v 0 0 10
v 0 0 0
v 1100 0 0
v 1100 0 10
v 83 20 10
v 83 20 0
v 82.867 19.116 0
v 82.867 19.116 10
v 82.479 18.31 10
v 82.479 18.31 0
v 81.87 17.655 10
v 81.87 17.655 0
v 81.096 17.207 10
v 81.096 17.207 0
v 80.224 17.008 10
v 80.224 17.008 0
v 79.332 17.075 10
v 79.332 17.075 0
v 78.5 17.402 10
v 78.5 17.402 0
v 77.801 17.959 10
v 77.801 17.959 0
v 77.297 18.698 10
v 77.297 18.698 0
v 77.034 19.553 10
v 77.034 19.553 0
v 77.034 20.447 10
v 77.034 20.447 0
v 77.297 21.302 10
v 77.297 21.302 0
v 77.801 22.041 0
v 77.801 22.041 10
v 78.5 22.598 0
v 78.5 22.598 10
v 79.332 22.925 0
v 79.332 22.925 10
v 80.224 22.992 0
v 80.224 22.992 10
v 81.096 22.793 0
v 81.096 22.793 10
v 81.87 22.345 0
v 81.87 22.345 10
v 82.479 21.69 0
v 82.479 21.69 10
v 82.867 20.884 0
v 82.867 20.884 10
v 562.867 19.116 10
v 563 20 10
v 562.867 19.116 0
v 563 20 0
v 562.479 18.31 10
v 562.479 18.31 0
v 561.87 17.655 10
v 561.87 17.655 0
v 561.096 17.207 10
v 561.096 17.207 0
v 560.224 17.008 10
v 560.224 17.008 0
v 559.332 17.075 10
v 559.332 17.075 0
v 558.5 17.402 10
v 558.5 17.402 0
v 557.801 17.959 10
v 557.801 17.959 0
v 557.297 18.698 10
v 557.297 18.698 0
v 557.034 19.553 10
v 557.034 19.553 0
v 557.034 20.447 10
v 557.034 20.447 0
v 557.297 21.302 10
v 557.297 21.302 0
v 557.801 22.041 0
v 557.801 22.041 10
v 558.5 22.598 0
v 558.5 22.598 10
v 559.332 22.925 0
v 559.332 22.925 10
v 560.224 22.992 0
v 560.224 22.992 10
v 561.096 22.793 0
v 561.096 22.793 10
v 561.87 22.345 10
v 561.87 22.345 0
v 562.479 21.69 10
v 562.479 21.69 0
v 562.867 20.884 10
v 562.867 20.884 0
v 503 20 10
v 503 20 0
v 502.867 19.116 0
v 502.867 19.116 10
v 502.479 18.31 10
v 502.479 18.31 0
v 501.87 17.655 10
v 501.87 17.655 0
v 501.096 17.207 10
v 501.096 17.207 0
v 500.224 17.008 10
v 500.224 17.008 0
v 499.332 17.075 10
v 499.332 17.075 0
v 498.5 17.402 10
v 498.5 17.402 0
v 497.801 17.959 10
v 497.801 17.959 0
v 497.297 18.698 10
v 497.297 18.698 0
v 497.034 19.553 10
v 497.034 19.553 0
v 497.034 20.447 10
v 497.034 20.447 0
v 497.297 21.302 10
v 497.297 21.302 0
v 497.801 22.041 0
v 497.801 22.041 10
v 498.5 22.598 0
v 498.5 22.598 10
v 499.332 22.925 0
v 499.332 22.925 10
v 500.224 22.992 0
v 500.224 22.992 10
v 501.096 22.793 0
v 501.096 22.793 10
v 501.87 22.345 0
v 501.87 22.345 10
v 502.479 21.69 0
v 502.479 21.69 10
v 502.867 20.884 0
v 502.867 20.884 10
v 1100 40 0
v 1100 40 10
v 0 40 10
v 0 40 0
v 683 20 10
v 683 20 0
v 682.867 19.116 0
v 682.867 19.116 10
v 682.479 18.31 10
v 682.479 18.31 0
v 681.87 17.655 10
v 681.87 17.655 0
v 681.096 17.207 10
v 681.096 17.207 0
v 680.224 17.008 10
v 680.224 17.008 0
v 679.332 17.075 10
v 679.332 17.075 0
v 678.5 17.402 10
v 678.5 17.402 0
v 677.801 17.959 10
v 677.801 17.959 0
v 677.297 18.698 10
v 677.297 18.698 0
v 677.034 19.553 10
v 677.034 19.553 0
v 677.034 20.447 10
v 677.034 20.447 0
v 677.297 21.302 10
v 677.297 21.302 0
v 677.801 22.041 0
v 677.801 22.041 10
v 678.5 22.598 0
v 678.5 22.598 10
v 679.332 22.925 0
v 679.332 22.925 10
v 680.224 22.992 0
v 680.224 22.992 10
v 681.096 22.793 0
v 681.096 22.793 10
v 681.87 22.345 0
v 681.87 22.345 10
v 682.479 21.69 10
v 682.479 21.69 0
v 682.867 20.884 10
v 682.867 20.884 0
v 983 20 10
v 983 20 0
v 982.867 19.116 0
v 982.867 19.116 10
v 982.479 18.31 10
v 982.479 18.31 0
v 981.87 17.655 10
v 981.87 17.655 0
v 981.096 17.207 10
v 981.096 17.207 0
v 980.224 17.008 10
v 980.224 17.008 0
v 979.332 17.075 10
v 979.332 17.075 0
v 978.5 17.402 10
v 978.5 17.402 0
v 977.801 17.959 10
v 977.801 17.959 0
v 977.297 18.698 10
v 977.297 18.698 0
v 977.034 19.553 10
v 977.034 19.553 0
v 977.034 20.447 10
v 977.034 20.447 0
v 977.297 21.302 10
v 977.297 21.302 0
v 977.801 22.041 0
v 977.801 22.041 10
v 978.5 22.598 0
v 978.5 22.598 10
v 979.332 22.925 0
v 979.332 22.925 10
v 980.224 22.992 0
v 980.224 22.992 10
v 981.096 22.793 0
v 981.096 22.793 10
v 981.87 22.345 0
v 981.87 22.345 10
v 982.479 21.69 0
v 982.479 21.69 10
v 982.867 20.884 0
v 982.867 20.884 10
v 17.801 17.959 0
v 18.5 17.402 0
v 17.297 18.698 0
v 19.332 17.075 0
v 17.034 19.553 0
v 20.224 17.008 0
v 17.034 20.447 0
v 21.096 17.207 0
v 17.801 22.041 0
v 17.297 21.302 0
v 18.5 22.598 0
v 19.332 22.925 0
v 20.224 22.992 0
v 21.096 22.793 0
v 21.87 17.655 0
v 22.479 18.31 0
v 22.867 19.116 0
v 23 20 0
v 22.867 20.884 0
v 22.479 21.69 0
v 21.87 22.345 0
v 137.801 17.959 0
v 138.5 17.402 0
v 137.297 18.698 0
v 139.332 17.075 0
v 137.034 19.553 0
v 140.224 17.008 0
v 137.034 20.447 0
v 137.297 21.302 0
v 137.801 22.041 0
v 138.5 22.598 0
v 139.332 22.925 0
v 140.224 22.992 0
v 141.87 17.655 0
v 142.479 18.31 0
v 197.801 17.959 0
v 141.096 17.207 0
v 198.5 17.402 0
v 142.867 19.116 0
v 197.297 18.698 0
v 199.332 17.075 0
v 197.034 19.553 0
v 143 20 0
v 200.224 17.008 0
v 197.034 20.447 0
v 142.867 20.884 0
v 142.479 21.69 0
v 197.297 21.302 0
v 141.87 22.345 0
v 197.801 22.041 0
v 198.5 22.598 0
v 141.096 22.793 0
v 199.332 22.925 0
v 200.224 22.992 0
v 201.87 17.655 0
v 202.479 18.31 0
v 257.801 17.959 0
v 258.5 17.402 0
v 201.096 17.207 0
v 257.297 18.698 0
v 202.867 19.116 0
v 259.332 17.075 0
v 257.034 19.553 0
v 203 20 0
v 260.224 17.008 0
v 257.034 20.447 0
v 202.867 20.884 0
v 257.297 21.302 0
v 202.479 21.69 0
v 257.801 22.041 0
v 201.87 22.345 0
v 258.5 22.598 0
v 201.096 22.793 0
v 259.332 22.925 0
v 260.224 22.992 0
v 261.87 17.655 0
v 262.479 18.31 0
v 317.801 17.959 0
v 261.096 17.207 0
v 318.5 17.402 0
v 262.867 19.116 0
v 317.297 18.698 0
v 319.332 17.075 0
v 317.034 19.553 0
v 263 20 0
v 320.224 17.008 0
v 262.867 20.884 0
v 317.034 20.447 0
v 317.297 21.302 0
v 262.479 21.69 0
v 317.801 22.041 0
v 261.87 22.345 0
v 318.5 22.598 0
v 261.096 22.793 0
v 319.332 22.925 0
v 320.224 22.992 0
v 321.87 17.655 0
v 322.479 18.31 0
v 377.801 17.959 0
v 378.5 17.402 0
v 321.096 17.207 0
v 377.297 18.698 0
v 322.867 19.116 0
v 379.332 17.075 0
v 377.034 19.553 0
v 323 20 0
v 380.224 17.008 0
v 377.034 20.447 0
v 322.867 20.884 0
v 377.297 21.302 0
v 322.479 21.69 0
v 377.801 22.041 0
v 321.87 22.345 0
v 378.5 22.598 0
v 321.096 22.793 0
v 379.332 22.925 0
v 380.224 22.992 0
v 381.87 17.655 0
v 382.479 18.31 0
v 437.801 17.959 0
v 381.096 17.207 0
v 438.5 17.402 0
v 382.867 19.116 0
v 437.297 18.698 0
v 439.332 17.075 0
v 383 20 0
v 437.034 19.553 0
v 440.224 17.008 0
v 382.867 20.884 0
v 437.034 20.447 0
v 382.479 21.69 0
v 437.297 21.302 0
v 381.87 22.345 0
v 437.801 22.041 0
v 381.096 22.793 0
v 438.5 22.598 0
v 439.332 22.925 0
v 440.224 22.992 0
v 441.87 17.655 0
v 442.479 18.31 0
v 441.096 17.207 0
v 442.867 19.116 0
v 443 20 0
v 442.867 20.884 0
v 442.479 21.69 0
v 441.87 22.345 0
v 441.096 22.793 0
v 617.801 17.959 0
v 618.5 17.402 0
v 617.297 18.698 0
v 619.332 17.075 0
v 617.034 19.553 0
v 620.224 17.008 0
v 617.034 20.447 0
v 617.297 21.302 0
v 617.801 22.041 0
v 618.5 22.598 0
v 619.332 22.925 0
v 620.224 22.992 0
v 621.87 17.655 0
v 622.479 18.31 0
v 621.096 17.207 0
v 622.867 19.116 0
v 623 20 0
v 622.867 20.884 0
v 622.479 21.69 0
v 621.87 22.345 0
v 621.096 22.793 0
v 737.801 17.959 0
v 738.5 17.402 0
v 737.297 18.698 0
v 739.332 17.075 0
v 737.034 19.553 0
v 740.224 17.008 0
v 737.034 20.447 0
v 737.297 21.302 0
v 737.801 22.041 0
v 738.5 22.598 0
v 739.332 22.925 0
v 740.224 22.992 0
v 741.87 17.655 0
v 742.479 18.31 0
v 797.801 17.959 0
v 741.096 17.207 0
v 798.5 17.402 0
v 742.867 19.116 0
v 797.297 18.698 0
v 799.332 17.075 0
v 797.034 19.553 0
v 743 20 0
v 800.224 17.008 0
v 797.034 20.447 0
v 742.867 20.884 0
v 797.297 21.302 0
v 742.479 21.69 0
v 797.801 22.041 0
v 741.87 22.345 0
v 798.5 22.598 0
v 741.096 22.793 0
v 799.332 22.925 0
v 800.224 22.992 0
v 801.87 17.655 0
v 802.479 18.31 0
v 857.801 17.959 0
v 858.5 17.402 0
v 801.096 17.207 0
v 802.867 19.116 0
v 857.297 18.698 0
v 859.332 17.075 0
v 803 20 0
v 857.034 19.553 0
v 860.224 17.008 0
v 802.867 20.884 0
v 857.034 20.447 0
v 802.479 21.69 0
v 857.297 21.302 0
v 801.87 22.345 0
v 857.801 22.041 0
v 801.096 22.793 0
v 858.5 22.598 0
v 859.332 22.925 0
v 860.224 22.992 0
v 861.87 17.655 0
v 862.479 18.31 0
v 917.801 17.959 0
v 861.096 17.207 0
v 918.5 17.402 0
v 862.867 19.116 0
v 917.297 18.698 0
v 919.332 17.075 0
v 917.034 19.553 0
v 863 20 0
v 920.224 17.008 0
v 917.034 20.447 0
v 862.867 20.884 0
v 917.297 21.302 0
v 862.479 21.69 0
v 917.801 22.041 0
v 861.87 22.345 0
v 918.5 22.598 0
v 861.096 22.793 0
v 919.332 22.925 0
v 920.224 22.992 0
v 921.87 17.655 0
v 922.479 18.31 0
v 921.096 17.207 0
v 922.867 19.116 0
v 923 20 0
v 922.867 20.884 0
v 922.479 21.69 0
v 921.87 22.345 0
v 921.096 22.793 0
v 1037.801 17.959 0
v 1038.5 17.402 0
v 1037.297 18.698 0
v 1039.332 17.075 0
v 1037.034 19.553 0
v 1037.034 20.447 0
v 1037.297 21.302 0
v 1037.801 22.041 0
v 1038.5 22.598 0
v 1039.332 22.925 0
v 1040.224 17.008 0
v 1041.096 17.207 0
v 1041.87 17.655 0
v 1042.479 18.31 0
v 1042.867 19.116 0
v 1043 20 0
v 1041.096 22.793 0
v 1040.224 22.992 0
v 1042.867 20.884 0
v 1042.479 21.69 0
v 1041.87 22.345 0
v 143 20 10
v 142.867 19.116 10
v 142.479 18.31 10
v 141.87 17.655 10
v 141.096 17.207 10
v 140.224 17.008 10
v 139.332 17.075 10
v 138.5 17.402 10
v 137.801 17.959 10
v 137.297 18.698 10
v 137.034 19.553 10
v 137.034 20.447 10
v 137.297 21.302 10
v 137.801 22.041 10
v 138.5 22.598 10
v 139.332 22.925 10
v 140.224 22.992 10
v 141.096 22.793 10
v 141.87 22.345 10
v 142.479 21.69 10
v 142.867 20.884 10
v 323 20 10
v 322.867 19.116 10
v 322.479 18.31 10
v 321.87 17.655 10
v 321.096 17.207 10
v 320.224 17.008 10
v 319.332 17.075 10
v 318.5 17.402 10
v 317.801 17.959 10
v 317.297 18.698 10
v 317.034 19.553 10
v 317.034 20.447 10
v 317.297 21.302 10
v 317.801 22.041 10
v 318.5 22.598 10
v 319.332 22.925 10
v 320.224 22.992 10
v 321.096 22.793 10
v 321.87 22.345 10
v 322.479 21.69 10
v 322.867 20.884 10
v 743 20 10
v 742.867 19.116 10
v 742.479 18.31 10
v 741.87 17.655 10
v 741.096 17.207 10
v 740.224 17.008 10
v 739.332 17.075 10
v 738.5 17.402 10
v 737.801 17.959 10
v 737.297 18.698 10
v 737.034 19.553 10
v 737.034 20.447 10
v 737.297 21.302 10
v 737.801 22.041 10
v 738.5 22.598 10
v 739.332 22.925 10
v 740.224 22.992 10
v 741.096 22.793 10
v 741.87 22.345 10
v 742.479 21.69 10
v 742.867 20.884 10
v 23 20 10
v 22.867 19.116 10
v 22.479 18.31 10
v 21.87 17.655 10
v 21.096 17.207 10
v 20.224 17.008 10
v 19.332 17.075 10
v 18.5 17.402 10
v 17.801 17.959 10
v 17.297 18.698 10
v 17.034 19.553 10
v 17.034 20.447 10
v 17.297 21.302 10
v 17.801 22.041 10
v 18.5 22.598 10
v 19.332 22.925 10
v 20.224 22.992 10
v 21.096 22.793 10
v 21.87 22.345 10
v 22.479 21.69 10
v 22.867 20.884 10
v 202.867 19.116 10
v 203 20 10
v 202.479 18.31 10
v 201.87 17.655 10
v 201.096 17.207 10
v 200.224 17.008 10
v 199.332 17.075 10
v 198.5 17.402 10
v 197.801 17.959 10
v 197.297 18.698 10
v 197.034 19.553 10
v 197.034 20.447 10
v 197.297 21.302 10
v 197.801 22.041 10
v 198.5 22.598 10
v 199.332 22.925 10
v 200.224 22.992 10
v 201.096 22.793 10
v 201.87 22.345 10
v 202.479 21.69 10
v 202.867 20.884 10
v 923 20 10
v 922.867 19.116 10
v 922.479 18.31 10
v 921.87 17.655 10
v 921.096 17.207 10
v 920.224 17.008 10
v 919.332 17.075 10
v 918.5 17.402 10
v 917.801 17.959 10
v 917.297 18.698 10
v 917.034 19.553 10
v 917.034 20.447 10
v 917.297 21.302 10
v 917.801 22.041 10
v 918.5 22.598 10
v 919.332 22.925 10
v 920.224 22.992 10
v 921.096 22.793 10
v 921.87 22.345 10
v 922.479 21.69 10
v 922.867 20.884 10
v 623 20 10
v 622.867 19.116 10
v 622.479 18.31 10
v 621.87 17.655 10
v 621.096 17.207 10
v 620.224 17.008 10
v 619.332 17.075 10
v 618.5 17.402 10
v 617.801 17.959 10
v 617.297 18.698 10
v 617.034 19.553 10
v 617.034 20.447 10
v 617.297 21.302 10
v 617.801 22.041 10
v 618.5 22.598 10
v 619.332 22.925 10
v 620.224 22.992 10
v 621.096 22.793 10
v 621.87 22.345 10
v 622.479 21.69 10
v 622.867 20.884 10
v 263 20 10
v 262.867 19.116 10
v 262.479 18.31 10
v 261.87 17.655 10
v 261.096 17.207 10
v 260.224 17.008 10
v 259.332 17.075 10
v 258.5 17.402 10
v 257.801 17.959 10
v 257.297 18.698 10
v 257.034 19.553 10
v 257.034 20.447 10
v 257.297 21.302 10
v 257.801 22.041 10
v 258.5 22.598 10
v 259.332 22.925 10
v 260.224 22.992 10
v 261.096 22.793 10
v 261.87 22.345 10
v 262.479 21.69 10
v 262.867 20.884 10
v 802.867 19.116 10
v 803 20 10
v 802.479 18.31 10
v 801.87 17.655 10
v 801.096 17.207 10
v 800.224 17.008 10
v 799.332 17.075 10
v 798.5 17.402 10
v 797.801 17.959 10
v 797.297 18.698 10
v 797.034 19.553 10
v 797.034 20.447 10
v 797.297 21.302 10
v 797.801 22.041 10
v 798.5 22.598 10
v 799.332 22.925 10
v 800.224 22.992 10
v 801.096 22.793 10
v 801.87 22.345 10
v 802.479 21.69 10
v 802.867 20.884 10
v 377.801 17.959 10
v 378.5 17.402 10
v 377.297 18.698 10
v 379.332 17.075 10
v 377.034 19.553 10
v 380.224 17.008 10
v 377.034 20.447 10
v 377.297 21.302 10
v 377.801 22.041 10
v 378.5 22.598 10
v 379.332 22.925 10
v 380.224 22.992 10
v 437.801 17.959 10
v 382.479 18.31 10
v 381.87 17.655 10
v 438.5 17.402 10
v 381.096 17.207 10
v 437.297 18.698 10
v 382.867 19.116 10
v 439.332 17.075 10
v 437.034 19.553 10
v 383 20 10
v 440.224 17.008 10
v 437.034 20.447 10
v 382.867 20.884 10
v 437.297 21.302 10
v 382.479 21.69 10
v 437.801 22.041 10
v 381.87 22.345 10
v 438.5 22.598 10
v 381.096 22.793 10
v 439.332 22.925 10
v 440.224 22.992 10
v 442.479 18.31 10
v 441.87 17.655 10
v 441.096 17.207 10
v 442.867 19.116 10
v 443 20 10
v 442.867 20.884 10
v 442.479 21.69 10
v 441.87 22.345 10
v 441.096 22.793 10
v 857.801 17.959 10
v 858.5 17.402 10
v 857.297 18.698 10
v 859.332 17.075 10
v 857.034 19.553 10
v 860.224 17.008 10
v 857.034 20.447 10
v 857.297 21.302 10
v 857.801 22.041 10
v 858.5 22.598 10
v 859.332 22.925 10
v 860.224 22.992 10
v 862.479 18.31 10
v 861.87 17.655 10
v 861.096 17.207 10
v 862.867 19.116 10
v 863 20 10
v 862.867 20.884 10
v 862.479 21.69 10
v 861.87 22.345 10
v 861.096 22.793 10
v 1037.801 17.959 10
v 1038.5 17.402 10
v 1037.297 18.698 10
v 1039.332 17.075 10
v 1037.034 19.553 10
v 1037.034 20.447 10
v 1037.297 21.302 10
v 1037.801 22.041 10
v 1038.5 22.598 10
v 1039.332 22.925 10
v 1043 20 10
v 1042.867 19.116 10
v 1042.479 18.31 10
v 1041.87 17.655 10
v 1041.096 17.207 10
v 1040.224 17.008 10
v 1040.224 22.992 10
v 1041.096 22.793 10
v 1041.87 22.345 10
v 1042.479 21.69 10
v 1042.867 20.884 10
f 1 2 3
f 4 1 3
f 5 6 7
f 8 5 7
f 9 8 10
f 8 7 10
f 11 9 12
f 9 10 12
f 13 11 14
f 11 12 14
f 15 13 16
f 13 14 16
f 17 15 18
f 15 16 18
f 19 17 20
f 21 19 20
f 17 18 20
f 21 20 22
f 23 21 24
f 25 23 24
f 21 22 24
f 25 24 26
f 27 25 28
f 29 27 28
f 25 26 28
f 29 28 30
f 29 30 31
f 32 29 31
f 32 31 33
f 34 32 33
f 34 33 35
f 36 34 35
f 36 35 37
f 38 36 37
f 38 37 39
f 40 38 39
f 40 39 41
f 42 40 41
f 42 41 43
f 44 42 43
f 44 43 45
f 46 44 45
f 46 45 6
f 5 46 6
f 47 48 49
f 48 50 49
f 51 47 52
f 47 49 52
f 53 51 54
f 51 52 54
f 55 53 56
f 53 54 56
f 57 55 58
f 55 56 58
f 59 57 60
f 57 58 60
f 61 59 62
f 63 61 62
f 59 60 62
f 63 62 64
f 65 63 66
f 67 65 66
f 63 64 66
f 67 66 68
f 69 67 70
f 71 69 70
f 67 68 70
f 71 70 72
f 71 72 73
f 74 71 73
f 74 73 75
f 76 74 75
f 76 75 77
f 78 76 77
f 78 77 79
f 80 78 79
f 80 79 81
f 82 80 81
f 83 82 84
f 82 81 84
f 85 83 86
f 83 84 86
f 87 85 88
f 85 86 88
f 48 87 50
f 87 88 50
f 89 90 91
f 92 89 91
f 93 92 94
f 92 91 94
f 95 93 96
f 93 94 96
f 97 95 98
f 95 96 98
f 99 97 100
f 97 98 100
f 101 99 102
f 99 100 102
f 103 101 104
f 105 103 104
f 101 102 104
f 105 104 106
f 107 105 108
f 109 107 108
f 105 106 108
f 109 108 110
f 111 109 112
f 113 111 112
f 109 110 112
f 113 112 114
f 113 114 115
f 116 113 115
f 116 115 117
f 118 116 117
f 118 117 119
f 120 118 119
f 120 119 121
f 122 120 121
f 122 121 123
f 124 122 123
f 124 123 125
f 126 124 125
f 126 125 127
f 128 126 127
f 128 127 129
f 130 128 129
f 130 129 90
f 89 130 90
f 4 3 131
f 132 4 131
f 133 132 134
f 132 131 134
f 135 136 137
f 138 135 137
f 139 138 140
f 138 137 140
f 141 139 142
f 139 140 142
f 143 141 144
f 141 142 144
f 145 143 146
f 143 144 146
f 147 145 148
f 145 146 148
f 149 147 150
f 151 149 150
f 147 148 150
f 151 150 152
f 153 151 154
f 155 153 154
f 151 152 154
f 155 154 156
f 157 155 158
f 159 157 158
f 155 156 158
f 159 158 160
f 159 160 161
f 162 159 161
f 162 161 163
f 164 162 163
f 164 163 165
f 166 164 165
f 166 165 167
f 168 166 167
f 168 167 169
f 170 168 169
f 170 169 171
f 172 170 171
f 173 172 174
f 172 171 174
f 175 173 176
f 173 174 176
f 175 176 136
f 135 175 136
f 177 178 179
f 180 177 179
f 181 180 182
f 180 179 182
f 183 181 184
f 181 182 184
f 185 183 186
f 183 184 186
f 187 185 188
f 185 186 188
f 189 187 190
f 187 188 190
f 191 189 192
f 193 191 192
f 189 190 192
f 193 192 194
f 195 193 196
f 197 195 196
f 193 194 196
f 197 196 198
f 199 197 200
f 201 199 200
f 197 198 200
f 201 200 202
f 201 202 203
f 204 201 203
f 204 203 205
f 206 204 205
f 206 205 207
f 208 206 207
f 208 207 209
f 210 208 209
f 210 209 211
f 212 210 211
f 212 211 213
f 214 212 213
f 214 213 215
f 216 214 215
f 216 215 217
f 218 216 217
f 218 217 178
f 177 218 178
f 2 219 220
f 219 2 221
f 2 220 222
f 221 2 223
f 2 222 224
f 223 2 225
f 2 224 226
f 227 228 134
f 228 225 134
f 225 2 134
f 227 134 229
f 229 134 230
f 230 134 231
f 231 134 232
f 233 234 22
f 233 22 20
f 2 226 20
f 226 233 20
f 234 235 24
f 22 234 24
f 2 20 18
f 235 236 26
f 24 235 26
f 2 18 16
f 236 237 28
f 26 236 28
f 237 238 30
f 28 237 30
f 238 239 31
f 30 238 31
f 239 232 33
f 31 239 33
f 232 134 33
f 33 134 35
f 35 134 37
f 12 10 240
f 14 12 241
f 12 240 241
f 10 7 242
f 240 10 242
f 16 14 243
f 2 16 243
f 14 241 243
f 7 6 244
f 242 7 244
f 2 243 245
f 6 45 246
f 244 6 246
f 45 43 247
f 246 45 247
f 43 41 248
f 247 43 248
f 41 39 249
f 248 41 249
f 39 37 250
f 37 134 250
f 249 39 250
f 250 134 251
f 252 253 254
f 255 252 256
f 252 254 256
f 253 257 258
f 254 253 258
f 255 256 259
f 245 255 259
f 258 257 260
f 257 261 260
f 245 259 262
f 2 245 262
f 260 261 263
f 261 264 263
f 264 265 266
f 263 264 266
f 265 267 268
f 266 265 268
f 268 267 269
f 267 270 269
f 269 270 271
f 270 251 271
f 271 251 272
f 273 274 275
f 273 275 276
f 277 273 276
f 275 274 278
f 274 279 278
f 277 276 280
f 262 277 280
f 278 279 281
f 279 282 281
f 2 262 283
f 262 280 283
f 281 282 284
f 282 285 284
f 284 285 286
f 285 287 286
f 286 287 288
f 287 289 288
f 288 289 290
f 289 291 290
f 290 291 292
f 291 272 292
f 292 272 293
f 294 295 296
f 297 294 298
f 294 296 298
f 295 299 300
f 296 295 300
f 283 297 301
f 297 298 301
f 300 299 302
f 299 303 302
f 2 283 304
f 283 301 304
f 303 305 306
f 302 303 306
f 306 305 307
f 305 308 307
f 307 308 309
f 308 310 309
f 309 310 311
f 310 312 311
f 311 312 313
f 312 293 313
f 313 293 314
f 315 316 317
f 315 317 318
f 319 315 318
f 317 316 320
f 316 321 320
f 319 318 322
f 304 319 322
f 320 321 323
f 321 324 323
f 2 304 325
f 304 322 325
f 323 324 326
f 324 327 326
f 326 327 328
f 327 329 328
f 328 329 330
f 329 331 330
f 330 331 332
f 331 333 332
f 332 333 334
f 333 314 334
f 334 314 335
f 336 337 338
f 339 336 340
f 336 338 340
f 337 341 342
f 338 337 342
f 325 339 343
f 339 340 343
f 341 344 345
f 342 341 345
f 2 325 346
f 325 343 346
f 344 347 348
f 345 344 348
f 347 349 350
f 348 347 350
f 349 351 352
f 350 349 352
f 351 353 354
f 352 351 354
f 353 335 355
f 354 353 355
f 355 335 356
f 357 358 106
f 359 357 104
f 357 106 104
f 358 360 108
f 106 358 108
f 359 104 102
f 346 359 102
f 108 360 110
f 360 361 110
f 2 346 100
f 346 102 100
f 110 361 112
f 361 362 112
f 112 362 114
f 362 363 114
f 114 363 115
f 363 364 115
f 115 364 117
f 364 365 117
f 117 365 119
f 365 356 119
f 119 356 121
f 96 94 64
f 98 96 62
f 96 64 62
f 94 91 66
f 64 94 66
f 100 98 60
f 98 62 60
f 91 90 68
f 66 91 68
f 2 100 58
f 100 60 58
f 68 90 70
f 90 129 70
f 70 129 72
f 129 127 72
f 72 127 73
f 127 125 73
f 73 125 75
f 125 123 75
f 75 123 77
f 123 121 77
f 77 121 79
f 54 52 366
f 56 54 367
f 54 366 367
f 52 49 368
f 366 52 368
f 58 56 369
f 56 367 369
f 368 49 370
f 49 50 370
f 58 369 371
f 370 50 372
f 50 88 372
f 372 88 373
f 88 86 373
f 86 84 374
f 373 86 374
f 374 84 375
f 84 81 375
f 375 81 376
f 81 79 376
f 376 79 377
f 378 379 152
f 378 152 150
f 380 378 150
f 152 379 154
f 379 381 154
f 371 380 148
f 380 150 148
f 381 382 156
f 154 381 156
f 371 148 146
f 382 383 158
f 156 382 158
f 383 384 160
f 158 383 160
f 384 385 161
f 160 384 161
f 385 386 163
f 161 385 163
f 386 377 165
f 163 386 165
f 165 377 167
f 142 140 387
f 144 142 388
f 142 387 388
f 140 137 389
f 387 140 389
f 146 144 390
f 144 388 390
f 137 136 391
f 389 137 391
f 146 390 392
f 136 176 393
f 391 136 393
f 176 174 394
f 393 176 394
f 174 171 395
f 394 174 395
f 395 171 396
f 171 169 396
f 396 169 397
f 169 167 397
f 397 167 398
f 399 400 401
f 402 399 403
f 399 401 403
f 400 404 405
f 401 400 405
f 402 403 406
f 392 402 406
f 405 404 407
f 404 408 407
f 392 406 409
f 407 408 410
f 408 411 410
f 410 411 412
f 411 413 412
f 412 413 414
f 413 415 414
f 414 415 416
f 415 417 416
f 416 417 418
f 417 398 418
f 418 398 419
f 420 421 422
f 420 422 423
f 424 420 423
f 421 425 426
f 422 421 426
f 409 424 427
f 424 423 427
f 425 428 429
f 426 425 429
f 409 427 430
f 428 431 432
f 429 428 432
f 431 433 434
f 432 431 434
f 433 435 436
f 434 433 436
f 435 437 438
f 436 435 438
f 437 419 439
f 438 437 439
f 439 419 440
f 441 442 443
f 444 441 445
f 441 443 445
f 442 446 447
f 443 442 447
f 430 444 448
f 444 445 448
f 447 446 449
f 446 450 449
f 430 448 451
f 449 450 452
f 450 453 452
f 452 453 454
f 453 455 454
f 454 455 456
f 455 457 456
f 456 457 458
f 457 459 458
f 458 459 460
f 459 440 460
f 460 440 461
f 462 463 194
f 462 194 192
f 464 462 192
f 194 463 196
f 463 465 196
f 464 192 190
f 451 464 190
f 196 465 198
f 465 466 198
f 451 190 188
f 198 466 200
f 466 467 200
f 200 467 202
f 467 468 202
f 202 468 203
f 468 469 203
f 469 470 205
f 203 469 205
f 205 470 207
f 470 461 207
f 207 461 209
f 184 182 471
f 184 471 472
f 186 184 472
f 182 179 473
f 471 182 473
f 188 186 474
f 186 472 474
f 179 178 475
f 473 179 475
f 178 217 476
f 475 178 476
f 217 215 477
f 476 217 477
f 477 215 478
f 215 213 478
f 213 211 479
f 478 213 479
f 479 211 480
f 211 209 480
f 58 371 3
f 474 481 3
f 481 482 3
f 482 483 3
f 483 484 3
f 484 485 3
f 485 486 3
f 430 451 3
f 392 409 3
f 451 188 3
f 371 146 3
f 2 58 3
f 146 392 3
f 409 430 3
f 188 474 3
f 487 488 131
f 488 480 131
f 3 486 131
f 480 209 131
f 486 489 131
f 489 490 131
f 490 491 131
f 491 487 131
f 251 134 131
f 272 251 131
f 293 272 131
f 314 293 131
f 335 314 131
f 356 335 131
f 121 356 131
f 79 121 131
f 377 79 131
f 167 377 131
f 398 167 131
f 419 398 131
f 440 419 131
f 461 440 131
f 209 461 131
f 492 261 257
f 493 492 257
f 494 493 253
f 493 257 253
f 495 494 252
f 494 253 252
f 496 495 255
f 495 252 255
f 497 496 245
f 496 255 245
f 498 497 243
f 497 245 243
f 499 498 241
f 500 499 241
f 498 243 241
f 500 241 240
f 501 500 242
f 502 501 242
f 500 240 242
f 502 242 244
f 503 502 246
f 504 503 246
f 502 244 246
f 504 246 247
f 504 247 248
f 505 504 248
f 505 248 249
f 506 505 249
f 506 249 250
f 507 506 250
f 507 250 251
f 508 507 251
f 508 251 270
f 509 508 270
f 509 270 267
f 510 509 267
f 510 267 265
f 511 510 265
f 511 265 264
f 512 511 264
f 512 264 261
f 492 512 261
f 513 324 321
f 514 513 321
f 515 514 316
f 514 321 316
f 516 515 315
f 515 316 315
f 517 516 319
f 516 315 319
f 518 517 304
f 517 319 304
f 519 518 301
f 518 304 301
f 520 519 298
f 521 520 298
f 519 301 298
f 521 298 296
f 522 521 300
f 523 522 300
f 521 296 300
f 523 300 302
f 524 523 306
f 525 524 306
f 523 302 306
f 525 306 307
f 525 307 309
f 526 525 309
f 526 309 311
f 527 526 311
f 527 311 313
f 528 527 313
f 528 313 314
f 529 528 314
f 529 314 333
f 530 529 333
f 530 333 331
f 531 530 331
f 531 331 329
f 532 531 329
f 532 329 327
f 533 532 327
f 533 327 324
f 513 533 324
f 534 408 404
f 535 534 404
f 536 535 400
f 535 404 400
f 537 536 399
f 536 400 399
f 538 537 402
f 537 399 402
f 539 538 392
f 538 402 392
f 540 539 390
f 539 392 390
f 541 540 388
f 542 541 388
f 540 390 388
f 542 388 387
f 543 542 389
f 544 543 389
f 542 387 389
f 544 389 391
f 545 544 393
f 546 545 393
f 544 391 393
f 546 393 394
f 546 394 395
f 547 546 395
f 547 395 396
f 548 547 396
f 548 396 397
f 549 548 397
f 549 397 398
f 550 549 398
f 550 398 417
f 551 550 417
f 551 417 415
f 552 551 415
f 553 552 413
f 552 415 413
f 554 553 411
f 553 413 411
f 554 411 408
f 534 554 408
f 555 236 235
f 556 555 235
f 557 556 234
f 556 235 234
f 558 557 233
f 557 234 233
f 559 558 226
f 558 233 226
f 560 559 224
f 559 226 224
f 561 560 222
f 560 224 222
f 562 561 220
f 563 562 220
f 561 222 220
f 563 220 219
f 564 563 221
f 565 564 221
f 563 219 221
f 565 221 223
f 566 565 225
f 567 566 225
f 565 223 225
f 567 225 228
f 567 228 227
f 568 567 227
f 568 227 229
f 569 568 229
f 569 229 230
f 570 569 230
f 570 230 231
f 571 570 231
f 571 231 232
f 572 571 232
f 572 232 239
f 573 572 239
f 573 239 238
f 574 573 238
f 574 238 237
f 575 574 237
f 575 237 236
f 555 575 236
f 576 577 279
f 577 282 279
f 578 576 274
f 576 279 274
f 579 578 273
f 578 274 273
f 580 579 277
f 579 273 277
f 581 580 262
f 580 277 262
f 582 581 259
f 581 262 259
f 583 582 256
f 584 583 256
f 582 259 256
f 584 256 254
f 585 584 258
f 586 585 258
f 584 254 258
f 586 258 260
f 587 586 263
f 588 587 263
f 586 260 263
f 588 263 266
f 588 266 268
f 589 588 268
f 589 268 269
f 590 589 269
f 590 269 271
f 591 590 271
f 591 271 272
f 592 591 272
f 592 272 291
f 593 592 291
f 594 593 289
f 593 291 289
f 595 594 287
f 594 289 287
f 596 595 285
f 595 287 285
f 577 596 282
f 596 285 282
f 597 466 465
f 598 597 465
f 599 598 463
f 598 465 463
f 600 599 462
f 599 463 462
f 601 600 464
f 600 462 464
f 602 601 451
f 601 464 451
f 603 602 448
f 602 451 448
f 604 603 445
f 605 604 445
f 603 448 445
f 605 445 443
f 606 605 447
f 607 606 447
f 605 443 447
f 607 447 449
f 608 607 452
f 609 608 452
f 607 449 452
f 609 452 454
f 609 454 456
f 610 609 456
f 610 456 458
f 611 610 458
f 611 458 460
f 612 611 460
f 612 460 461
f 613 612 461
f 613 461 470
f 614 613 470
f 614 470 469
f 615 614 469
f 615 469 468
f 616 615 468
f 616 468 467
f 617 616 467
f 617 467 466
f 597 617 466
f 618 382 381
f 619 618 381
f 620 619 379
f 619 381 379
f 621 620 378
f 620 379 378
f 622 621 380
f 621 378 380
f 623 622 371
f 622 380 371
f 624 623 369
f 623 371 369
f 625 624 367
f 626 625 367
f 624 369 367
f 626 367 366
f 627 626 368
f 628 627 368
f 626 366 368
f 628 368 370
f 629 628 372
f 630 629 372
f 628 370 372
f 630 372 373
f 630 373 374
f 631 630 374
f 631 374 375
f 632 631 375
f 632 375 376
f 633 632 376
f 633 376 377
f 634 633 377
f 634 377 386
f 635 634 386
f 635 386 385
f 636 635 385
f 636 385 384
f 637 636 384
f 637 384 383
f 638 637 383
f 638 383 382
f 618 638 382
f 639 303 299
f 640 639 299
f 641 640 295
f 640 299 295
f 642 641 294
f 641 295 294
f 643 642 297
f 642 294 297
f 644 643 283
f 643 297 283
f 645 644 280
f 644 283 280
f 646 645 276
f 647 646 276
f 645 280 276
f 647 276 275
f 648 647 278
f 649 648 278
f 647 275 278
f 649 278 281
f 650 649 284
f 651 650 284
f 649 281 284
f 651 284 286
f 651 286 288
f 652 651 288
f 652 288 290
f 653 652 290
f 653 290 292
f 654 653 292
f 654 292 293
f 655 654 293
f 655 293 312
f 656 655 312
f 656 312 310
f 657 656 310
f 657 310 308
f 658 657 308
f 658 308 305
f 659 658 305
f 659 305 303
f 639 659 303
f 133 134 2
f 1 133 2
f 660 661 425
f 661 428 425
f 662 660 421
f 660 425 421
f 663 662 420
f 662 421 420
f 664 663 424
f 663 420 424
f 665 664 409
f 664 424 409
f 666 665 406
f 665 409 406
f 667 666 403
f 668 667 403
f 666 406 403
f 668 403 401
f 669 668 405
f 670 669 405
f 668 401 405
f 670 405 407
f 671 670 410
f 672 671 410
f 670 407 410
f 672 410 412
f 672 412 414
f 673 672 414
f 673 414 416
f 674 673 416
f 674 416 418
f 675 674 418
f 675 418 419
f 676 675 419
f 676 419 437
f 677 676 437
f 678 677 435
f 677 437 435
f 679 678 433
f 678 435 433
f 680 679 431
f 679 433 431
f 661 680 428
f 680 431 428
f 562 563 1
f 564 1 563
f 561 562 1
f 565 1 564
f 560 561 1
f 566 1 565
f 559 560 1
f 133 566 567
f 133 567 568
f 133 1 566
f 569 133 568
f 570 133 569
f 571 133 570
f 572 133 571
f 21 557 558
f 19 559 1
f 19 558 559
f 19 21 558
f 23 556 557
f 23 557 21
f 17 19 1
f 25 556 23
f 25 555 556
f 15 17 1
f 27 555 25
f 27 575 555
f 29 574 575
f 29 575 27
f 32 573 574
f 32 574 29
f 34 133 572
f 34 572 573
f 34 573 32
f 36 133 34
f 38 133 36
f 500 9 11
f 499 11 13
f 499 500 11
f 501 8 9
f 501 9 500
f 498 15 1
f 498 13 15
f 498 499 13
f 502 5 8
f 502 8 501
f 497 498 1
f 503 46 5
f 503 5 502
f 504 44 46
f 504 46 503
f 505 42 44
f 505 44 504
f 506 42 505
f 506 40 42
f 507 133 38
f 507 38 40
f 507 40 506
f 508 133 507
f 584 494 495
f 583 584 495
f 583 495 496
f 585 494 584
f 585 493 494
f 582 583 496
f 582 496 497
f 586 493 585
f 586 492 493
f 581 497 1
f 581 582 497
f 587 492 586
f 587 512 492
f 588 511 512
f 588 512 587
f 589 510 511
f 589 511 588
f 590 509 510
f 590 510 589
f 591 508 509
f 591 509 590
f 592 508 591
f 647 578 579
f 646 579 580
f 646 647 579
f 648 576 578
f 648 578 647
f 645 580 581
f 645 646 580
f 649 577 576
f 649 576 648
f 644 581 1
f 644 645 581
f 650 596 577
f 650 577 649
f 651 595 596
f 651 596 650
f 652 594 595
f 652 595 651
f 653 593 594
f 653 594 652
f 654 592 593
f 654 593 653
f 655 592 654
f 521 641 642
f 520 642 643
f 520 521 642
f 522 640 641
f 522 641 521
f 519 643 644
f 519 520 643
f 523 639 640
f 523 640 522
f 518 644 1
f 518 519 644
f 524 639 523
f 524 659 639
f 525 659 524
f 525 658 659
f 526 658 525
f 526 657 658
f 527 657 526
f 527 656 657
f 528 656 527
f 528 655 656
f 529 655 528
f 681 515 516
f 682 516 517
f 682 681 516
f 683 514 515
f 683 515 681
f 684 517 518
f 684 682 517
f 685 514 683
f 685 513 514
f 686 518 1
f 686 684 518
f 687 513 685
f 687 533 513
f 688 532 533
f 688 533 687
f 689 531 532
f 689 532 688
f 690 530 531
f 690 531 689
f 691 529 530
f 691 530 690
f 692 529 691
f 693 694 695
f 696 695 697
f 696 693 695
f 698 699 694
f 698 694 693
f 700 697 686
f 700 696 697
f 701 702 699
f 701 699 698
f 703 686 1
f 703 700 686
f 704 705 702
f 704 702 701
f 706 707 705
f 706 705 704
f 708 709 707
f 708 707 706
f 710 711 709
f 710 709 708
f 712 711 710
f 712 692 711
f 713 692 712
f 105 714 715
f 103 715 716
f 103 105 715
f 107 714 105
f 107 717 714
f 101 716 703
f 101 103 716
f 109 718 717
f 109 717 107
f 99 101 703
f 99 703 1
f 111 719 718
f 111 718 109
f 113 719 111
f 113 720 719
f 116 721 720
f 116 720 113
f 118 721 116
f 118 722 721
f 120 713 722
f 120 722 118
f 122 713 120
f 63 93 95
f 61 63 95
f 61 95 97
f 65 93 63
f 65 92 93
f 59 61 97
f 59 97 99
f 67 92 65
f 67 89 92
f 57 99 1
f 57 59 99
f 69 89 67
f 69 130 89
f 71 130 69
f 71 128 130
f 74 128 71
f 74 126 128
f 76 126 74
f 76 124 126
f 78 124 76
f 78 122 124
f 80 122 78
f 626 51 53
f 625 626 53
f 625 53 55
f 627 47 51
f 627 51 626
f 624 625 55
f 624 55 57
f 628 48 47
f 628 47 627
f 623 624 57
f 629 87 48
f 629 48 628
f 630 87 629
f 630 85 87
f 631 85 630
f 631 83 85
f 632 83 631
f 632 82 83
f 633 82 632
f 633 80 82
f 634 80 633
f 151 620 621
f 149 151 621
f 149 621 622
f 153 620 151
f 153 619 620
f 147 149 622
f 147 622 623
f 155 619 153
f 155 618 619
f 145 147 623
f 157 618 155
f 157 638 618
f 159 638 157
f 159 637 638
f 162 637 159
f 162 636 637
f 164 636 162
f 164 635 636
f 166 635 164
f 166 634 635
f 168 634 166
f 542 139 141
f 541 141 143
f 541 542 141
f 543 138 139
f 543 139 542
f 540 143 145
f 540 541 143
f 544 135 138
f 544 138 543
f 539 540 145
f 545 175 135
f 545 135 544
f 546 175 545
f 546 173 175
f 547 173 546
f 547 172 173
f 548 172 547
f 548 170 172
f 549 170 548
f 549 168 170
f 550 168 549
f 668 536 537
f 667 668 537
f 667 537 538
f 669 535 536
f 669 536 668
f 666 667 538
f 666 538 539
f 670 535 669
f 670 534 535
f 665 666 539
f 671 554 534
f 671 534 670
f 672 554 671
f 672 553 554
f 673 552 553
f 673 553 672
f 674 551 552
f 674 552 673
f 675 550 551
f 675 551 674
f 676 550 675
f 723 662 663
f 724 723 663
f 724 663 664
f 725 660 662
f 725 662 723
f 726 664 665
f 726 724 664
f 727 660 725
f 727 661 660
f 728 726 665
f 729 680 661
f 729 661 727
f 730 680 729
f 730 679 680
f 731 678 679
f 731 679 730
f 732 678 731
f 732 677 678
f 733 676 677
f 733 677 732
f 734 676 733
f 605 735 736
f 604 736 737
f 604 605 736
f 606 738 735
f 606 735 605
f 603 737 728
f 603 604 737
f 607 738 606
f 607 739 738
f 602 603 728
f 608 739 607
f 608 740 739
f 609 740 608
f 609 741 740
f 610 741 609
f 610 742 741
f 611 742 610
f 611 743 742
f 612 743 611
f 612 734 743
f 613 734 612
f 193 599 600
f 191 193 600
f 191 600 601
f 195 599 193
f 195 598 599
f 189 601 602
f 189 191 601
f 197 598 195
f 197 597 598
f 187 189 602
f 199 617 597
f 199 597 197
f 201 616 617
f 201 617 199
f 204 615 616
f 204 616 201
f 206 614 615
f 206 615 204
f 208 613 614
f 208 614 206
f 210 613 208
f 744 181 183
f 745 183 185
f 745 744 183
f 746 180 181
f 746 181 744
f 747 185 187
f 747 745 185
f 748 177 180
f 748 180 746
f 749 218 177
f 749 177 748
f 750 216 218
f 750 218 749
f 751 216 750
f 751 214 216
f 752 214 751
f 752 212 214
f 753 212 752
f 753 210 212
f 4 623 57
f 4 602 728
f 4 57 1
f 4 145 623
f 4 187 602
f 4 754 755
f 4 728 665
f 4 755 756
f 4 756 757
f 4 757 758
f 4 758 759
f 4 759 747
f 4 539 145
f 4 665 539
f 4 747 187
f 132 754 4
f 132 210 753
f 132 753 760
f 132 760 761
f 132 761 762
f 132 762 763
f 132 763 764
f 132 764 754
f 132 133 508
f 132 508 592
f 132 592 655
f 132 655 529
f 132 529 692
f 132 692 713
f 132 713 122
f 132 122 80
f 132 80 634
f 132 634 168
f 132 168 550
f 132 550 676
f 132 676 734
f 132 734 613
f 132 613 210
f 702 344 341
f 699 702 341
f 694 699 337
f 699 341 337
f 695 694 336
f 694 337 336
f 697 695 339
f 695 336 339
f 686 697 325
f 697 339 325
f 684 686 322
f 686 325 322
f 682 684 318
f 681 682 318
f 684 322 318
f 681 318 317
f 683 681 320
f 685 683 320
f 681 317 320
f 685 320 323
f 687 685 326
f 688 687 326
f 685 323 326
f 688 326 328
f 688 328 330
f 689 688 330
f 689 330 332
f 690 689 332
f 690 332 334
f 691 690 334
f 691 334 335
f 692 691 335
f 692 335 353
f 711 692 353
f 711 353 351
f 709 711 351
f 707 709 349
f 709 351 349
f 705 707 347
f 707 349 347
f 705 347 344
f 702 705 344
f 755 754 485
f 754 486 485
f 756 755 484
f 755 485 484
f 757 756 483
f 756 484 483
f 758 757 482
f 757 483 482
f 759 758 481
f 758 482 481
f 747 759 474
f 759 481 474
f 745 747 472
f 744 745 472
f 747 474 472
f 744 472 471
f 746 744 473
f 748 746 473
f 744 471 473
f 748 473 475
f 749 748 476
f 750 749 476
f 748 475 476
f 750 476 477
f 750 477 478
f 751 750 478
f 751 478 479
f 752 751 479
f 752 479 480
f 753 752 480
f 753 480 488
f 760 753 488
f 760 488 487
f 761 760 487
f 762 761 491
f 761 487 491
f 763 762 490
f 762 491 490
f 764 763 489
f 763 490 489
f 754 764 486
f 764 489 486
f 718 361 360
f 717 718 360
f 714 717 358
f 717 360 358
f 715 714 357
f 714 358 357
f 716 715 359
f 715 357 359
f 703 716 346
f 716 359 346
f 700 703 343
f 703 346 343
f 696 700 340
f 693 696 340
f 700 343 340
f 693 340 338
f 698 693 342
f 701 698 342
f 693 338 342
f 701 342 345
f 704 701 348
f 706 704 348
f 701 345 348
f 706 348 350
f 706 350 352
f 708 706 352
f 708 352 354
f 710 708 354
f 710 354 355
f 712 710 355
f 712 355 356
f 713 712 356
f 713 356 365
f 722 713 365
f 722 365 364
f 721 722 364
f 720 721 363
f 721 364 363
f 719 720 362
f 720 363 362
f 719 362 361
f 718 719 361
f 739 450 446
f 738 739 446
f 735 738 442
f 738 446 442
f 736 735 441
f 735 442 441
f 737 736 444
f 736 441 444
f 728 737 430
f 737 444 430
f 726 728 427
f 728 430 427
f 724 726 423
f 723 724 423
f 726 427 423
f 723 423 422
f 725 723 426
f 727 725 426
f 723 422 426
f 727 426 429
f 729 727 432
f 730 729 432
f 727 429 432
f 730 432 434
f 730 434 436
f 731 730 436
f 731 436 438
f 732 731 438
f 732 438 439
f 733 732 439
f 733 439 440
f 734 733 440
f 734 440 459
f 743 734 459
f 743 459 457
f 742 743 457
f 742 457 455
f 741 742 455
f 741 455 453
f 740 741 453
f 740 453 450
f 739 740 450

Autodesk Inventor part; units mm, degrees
ref_plane "YZ Plane" through (0, 0, 0) normal (1, 0, 0) x (0, 1, 0)
ref_plane "XZ Plane" through (0, 0, 0) normal (0, 1, 0) x (-1, 0, 0)
ref_plane "XY Plane" through (0, 0, 0) normal (0, 0, 1) x (1, 0, 0)
sketch "Sketch1" plane through (0, 0, 0) normal (0, 0, 1) x (1, 0, 0)
  line L0 (0, 0) -> (1100, 0)
  line L1 (1100, 0) -> (1100, 40)
  line L2 (1100, 40) -> (0, 40)
  line L3 (0, 40) -> (0, 0)
  line L4 (1100, 40) -> (1040, 40)
  line L5 (1040, 40) -> (980, 40)
  line L6 (980, 40) -> (920, 40)
  line L7 (920, 40) -> (860, 40)
  line L8 (860, 40) -> (800, 40)
  line L9 (800, 40) -> (740, 40)
  line L10 (740, 40) -> (680, 40)
  line L11 (680, 40) -> (620, 40)
  line L12 (620, 40) -> (560, 40)
  line L13 (560, 40) -> (500, 40)
  line L14 (500, 40) -> (440, 40)
  line L15 (440, 40) -> (380, 40)
  line L16 (380, 40) -> (320, 40)
  line L17 (320, 40) -> (260, 40)
  line L18 (260, 40) -> (200, 40)
  line L19 (200, 40) -> (140, 40)
  line L20 (140, 40) -> (80, 40)
  line L21 (80, 40) -> (20, 40)
  circle A0 centre (1040, 20) radius 3
  circle A1 centre (980, 20) radius 3
  circle A2 centre (920, 20) radius 3
  circle A3 centre (860, 23) radius 3
  circle A4 centre (800, 20) radius 3
  circle A5 centre (740, 20) radius 3
  circle A6 centre (680, 20) radius 3
  circle A7 centre (560, 20) radius 3
  circle A8 centre (500, 20) radius 3
  circle A9 centre (440, 20) radius 3
  circle A10 centre (380, 20) radius 3
  circle A11 centre (320, 20) radius 3
  circle A12 centre (260, 20) radius 3
  circle A13 centre (200, 20) radius 3
  circle A14 centre (140, 20) radius 3
  circle A15 centre (80, 20) radius 3
  circle A16 centre (20, 20) radius 3
  dimension "d0" = 1100
  dimension "d1" = 40
  dimension "d22" = 6
  dimension "d23" = 6
  dimension "d24" = 6
  dimension "d25" = 6
  dimension "d26" = 6
  dimension "d27" = 6
  dimension "d28" = 6
  dimension "d30" = 6
  dimension "d31" = 6
  dimension "d32" = 6
  dimension "d33" = 6
  dimension "d34" = 6
  dimension "d35" = 6
  dimension "d36" = 6
  dimension "d38" = 6
  dimension "d39" = 6
  dimension "d40" = 6
extrude "Extrusion1" add sketch "Sketch1" along normal blind 10 contours L3 L2 L1 L0 | A0 | A1 | A2 | A3 | A4 | A5 | A6 | A7 | A8 | A9 | A10 | A11 | A12 | A13 | A14 | A15 | A16
sketch "Sketch2" plane through (0, 0, 0) normal (0, 0, 1) x (1, 0, 0)
  line L0 (1100, 40) -> (0, 40) projected
  line L1 (0, 40) -> (0, 20)
  line L2 (0, 40) -> (0, 0) projected
  line L3 (1100, 20) -> (1040, 20)
  line L4 (1040, 20) -> (980, 20)
  line L5 (980, 20) -> (920, 20)
  line L6 (920, 20) -> (860, 20)
  line L7 (860, 20) -> (800, 20)
  line L8 (800, 20) -> (740, 20)
  line L9 (740, 20) -> (680, 20)
  line L10 (680, 20) -> (620, 20)
  line L11 (620, 20) -> (560, 20)
  line L12 (560, 20) -> (500, 20)
  line L13 (500, 20) -> (440, 20)
  line L14 (440, 20) -> (380, 20)
  line L15 (380, 20) -> (320, 20)
  line L16 (320, 20) -> (260, 20)
  line L17 (260, 20) -> (200, 20)
  line L18 (200, 20) -> (140, 20)
  line L19 (140, 20) -> (80, 20)
  line L20 (80, 20) -> (20, 20)
  circle A0 centre (740, 20) radius 3
  circle A1 centre (800, 20) radius 3
  circle A2 centre (860, 20) radius 3
  circle A3 centre (680, 20) radius 3
  circle A4 centre (1040, 20) radius 3
  circle A5 centre (980, 20) radius 3
  circle A6 centre (920, 20) radius 3
  circle A7 centre (620, 20) radius 3
  circle A8 centre (560, 20) radius 3
  circle A9 centre (500, 20) radius 3
  circle A10 centre (440, 20) radius 3
  circle A11 centre (380, 20) radius 3
  circle A12 centre (320, 20) radius 3
  circle A13 centre (260, 20) radius 3
  circle A14 centre (200, 20) radius 3
  circle A15 centre (140, 20) radius 3
  circle A16 centre (80, 20) radius 3
  circle A17 centre (20, 20) radius 3
  dimension "d41" = 60
  dimension "d42" = 60
  dimension "d43" = 60
  dimension "d44" = 60
  dimension "d45" = 60
  dimension "d46" = 60
  dimension "d47" = 60
  dimension "d48" = 60
  dimension "d49" = 60
  dimension "d50" = 60
  dimension "d51" = 60
  dimension "d52" = 60
  dimension "d53" = 60
  dimension "d54" = 60
  dimension "d55" = 60
  dimension "d56" = 60
  dimension "d57" = 60
  dimension "d58" = 60
  dimension "d59" = 6
  dimension "d60" = 6
  dimension "d61" = 6
  dimension "d62" = 6
  dimension "d63" = 6
  dimension "d64" = 6
  dimension "d65" = 6
  dimension "d66" = 6
  dimension "d67" = 6
  dimension "d68" = 6
  dimension "d69" = 6
  dimension "d70" = 6
  dimension "d71" = 6
  dimension "d72" = 6
  dimension "d73" = 6
  dimension "d74" = 6
  dimension "d75" = 6
  dimension "d76" = 6
extrude "Extrusion2" cut sketch "Sketch2" along normal mid plane 100
properties part number "RailBar" material "Stainless Steel"
